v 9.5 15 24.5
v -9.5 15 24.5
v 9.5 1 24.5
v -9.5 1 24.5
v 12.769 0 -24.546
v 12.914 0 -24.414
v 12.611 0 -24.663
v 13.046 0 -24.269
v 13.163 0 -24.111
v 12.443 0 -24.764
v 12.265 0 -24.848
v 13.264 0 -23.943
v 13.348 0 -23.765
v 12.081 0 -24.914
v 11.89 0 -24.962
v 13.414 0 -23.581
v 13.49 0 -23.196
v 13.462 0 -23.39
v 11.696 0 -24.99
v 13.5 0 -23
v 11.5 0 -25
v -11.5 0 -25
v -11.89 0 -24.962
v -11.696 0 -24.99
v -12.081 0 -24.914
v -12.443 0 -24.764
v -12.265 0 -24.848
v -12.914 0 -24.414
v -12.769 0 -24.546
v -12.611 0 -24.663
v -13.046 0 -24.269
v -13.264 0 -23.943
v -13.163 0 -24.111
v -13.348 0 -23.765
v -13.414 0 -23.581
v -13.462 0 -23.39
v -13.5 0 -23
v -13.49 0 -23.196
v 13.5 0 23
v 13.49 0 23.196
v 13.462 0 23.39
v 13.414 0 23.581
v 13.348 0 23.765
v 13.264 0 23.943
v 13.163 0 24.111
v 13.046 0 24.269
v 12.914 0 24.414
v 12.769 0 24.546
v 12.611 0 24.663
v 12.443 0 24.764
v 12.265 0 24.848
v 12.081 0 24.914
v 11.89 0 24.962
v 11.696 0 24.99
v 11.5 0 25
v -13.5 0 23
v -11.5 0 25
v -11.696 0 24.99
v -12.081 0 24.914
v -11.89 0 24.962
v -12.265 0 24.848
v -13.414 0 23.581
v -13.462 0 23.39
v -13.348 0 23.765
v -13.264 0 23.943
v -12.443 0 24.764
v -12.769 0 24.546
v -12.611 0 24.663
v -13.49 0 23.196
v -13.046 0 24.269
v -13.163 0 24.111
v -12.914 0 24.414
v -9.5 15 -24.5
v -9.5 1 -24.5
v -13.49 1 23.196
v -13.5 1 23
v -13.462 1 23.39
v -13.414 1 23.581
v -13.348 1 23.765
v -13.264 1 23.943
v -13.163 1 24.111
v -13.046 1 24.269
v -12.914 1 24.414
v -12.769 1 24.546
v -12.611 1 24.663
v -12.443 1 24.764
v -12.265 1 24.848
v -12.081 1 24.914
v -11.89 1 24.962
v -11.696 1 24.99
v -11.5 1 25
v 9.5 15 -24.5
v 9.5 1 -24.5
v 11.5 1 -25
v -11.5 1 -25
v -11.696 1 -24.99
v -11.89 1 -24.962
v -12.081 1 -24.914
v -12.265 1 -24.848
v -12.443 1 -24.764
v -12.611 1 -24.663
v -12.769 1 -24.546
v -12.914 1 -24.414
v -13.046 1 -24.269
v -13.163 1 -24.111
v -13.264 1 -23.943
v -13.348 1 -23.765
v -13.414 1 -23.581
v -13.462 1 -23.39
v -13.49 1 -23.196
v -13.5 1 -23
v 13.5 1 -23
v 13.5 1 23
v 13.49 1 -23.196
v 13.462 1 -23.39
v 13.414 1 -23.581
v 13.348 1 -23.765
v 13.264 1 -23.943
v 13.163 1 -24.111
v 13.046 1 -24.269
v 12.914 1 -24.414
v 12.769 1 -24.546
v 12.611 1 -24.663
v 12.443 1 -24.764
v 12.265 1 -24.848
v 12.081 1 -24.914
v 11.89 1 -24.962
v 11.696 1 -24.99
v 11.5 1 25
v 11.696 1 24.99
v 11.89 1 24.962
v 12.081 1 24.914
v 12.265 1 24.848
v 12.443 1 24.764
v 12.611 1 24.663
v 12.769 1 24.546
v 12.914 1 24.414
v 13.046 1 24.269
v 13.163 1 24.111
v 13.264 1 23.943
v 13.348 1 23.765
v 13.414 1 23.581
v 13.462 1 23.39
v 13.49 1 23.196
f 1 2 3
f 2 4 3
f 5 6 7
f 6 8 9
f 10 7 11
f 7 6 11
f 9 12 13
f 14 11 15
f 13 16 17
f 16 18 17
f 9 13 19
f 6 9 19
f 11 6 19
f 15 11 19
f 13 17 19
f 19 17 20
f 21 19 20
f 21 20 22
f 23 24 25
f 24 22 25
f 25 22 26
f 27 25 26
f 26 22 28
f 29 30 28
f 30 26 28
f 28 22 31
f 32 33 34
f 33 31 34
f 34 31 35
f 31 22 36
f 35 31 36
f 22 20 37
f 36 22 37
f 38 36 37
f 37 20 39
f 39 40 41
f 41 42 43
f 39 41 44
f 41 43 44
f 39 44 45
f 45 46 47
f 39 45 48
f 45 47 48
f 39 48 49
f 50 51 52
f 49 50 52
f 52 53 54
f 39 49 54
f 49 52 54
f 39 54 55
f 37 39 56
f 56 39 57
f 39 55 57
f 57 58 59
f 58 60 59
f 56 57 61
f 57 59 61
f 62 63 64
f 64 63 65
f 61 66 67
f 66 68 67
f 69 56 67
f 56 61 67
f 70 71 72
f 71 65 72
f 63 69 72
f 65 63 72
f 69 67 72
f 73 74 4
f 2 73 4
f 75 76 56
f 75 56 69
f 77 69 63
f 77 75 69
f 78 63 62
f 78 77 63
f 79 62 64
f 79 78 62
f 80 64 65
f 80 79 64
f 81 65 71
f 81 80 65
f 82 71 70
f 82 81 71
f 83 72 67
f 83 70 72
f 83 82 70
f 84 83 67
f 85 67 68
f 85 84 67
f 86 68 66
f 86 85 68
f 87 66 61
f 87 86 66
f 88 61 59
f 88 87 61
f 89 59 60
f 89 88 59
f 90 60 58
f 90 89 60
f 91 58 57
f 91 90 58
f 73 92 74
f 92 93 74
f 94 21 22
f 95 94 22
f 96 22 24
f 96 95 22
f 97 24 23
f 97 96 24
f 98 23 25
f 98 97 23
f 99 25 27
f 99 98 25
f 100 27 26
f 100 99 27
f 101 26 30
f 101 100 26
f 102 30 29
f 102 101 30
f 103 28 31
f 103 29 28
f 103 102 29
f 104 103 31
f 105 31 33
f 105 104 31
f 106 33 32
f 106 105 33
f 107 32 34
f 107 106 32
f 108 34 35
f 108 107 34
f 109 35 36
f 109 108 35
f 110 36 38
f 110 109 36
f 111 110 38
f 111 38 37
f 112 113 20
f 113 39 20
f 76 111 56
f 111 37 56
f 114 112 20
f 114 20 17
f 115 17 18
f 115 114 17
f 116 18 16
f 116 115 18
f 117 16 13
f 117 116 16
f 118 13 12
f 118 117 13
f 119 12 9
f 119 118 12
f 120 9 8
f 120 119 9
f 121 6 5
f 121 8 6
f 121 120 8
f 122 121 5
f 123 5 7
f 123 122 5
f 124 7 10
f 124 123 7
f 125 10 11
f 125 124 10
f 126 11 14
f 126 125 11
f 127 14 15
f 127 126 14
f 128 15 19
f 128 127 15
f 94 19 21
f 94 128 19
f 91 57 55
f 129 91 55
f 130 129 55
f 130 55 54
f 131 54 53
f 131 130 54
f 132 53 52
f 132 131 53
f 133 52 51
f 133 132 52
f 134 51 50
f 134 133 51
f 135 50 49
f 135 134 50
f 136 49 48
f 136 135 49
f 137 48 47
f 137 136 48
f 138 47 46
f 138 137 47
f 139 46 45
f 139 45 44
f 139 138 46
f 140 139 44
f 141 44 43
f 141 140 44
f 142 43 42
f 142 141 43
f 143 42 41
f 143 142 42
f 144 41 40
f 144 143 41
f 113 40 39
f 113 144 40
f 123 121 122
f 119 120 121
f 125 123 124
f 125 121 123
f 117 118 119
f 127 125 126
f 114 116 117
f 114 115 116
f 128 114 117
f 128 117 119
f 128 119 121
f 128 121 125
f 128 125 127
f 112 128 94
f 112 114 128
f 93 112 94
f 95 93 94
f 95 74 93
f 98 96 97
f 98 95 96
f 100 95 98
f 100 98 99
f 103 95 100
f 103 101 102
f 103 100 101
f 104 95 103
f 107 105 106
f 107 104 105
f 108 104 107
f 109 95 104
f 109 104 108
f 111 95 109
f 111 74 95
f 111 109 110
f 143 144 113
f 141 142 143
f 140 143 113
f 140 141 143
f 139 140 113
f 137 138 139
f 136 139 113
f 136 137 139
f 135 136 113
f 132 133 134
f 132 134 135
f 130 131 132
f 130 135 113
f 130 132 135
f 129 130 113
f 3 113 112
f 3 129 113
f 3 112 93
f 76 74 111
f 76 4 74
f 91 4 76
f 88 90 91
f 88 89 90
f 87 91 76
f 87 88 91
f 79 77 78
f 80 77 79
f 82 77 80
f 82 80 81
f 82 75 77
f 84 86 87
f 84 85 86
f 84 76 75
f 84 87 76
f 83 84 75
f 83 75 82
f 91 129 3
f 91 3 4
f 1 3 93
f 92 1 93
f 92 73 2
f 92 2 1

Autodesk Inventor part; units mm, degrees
ref_plane "YZ Plane" through (0, 0, 0) normal (1, 0, 0) x (0, 1, 0)
ref_plane "XZ Plane" through (0, 0, 0) normal (0, 1, 0) x (-1, 0, 0)
ref_plane "XY Plane" through (0, 0, 0) normal (0, 0, 1) x (1, 0, 0)
sketch "Sketch1" plane through (0, 0, 0) normal (0, 1, 0) x (-1, 0, 0)
  line L0 (-13.5, 25) -> (-13.5, -25)
  line L1 (-13.5, -25) -> (13.5, -25)
  line L2 (13.5, -25) -> (13.5, 25)
  line L3 (13.5, 25) -> (-13.5, 25)
  line L4 (-13.5, 25) -> (13.5, -25) construction
  line L5 (-13.5, -25) -> (13.5, 25) construction
  point P0 (0, 0)
  dimension "d0" = 50
  dimension "d1" = 27
extrude "Extrusion1" add sketch "Sketch1" along normal blind 1
fillet "Fillet1" radius 2 4 edges at (13.5, 0.5, 25) (-13.5, 0.5, 25) (-13.5, 0.5, -25) (13.5, 0.5, -25)
sketch "Sketch2" plane through (0, 1, 0) normal (0, 1, 0) x (1, 0, 0)
  line L0 (9.5, -24.5) -> (9.5, 24.5)
  line L1 (9.5, 24.5) -> (-9.5, 24.5)
  line L2 (-9.5, 24.5) -> (-9.5, -24.5)
  line L3 (-9.5, -24.5) -> (9.5, -24.5)
  line L4 (9.5, -24.5) -> (-9.5, 24.5) construction
  line L5 (9.5, 24.5) -> (-9.5, -24.5) construction
  point P0 (0, 0)
  dimension "d5" = 49
  dimension "d6" = 19
extrude "Extrusion2" add sketch "Sketch2" along normal blind 14
sketch "Sketch3" plane through (0, 15, 0) normal (0, 1, 0) x (1, 0, 0)
  point P0 (0, 0)
sketch "Sketch4" plane through (0, 15, 0) normal (0, 1, 0) x (1, 0, 0)
  line L0 (-9.2797, -24.5843) -> (-9.5, 24.5) construction
  line L1 (-9.5, 24.5) -> (9.2797, 24.5843) construction
  line L2 (9.2797, 24.5843) -> (9.5, -24.5) construction
  line L3 (9.5, -24.5) -> (-9.2797, -24.5843) construction
  line L4 (9.5, -24.5) -> (9.5, 24.5) projected
  line L5 (9.5, 24.5) -> (-9.5, 24.5) projected
  line L6 (-9.5, 24.5) -> (-9.5, -24.5) projected
  line L7 (-9.5, -24.5) -> (9.5, -24.5) projected
  point P0 (0, 0)
decal "Decal1"
properties part number "Digit Display"
